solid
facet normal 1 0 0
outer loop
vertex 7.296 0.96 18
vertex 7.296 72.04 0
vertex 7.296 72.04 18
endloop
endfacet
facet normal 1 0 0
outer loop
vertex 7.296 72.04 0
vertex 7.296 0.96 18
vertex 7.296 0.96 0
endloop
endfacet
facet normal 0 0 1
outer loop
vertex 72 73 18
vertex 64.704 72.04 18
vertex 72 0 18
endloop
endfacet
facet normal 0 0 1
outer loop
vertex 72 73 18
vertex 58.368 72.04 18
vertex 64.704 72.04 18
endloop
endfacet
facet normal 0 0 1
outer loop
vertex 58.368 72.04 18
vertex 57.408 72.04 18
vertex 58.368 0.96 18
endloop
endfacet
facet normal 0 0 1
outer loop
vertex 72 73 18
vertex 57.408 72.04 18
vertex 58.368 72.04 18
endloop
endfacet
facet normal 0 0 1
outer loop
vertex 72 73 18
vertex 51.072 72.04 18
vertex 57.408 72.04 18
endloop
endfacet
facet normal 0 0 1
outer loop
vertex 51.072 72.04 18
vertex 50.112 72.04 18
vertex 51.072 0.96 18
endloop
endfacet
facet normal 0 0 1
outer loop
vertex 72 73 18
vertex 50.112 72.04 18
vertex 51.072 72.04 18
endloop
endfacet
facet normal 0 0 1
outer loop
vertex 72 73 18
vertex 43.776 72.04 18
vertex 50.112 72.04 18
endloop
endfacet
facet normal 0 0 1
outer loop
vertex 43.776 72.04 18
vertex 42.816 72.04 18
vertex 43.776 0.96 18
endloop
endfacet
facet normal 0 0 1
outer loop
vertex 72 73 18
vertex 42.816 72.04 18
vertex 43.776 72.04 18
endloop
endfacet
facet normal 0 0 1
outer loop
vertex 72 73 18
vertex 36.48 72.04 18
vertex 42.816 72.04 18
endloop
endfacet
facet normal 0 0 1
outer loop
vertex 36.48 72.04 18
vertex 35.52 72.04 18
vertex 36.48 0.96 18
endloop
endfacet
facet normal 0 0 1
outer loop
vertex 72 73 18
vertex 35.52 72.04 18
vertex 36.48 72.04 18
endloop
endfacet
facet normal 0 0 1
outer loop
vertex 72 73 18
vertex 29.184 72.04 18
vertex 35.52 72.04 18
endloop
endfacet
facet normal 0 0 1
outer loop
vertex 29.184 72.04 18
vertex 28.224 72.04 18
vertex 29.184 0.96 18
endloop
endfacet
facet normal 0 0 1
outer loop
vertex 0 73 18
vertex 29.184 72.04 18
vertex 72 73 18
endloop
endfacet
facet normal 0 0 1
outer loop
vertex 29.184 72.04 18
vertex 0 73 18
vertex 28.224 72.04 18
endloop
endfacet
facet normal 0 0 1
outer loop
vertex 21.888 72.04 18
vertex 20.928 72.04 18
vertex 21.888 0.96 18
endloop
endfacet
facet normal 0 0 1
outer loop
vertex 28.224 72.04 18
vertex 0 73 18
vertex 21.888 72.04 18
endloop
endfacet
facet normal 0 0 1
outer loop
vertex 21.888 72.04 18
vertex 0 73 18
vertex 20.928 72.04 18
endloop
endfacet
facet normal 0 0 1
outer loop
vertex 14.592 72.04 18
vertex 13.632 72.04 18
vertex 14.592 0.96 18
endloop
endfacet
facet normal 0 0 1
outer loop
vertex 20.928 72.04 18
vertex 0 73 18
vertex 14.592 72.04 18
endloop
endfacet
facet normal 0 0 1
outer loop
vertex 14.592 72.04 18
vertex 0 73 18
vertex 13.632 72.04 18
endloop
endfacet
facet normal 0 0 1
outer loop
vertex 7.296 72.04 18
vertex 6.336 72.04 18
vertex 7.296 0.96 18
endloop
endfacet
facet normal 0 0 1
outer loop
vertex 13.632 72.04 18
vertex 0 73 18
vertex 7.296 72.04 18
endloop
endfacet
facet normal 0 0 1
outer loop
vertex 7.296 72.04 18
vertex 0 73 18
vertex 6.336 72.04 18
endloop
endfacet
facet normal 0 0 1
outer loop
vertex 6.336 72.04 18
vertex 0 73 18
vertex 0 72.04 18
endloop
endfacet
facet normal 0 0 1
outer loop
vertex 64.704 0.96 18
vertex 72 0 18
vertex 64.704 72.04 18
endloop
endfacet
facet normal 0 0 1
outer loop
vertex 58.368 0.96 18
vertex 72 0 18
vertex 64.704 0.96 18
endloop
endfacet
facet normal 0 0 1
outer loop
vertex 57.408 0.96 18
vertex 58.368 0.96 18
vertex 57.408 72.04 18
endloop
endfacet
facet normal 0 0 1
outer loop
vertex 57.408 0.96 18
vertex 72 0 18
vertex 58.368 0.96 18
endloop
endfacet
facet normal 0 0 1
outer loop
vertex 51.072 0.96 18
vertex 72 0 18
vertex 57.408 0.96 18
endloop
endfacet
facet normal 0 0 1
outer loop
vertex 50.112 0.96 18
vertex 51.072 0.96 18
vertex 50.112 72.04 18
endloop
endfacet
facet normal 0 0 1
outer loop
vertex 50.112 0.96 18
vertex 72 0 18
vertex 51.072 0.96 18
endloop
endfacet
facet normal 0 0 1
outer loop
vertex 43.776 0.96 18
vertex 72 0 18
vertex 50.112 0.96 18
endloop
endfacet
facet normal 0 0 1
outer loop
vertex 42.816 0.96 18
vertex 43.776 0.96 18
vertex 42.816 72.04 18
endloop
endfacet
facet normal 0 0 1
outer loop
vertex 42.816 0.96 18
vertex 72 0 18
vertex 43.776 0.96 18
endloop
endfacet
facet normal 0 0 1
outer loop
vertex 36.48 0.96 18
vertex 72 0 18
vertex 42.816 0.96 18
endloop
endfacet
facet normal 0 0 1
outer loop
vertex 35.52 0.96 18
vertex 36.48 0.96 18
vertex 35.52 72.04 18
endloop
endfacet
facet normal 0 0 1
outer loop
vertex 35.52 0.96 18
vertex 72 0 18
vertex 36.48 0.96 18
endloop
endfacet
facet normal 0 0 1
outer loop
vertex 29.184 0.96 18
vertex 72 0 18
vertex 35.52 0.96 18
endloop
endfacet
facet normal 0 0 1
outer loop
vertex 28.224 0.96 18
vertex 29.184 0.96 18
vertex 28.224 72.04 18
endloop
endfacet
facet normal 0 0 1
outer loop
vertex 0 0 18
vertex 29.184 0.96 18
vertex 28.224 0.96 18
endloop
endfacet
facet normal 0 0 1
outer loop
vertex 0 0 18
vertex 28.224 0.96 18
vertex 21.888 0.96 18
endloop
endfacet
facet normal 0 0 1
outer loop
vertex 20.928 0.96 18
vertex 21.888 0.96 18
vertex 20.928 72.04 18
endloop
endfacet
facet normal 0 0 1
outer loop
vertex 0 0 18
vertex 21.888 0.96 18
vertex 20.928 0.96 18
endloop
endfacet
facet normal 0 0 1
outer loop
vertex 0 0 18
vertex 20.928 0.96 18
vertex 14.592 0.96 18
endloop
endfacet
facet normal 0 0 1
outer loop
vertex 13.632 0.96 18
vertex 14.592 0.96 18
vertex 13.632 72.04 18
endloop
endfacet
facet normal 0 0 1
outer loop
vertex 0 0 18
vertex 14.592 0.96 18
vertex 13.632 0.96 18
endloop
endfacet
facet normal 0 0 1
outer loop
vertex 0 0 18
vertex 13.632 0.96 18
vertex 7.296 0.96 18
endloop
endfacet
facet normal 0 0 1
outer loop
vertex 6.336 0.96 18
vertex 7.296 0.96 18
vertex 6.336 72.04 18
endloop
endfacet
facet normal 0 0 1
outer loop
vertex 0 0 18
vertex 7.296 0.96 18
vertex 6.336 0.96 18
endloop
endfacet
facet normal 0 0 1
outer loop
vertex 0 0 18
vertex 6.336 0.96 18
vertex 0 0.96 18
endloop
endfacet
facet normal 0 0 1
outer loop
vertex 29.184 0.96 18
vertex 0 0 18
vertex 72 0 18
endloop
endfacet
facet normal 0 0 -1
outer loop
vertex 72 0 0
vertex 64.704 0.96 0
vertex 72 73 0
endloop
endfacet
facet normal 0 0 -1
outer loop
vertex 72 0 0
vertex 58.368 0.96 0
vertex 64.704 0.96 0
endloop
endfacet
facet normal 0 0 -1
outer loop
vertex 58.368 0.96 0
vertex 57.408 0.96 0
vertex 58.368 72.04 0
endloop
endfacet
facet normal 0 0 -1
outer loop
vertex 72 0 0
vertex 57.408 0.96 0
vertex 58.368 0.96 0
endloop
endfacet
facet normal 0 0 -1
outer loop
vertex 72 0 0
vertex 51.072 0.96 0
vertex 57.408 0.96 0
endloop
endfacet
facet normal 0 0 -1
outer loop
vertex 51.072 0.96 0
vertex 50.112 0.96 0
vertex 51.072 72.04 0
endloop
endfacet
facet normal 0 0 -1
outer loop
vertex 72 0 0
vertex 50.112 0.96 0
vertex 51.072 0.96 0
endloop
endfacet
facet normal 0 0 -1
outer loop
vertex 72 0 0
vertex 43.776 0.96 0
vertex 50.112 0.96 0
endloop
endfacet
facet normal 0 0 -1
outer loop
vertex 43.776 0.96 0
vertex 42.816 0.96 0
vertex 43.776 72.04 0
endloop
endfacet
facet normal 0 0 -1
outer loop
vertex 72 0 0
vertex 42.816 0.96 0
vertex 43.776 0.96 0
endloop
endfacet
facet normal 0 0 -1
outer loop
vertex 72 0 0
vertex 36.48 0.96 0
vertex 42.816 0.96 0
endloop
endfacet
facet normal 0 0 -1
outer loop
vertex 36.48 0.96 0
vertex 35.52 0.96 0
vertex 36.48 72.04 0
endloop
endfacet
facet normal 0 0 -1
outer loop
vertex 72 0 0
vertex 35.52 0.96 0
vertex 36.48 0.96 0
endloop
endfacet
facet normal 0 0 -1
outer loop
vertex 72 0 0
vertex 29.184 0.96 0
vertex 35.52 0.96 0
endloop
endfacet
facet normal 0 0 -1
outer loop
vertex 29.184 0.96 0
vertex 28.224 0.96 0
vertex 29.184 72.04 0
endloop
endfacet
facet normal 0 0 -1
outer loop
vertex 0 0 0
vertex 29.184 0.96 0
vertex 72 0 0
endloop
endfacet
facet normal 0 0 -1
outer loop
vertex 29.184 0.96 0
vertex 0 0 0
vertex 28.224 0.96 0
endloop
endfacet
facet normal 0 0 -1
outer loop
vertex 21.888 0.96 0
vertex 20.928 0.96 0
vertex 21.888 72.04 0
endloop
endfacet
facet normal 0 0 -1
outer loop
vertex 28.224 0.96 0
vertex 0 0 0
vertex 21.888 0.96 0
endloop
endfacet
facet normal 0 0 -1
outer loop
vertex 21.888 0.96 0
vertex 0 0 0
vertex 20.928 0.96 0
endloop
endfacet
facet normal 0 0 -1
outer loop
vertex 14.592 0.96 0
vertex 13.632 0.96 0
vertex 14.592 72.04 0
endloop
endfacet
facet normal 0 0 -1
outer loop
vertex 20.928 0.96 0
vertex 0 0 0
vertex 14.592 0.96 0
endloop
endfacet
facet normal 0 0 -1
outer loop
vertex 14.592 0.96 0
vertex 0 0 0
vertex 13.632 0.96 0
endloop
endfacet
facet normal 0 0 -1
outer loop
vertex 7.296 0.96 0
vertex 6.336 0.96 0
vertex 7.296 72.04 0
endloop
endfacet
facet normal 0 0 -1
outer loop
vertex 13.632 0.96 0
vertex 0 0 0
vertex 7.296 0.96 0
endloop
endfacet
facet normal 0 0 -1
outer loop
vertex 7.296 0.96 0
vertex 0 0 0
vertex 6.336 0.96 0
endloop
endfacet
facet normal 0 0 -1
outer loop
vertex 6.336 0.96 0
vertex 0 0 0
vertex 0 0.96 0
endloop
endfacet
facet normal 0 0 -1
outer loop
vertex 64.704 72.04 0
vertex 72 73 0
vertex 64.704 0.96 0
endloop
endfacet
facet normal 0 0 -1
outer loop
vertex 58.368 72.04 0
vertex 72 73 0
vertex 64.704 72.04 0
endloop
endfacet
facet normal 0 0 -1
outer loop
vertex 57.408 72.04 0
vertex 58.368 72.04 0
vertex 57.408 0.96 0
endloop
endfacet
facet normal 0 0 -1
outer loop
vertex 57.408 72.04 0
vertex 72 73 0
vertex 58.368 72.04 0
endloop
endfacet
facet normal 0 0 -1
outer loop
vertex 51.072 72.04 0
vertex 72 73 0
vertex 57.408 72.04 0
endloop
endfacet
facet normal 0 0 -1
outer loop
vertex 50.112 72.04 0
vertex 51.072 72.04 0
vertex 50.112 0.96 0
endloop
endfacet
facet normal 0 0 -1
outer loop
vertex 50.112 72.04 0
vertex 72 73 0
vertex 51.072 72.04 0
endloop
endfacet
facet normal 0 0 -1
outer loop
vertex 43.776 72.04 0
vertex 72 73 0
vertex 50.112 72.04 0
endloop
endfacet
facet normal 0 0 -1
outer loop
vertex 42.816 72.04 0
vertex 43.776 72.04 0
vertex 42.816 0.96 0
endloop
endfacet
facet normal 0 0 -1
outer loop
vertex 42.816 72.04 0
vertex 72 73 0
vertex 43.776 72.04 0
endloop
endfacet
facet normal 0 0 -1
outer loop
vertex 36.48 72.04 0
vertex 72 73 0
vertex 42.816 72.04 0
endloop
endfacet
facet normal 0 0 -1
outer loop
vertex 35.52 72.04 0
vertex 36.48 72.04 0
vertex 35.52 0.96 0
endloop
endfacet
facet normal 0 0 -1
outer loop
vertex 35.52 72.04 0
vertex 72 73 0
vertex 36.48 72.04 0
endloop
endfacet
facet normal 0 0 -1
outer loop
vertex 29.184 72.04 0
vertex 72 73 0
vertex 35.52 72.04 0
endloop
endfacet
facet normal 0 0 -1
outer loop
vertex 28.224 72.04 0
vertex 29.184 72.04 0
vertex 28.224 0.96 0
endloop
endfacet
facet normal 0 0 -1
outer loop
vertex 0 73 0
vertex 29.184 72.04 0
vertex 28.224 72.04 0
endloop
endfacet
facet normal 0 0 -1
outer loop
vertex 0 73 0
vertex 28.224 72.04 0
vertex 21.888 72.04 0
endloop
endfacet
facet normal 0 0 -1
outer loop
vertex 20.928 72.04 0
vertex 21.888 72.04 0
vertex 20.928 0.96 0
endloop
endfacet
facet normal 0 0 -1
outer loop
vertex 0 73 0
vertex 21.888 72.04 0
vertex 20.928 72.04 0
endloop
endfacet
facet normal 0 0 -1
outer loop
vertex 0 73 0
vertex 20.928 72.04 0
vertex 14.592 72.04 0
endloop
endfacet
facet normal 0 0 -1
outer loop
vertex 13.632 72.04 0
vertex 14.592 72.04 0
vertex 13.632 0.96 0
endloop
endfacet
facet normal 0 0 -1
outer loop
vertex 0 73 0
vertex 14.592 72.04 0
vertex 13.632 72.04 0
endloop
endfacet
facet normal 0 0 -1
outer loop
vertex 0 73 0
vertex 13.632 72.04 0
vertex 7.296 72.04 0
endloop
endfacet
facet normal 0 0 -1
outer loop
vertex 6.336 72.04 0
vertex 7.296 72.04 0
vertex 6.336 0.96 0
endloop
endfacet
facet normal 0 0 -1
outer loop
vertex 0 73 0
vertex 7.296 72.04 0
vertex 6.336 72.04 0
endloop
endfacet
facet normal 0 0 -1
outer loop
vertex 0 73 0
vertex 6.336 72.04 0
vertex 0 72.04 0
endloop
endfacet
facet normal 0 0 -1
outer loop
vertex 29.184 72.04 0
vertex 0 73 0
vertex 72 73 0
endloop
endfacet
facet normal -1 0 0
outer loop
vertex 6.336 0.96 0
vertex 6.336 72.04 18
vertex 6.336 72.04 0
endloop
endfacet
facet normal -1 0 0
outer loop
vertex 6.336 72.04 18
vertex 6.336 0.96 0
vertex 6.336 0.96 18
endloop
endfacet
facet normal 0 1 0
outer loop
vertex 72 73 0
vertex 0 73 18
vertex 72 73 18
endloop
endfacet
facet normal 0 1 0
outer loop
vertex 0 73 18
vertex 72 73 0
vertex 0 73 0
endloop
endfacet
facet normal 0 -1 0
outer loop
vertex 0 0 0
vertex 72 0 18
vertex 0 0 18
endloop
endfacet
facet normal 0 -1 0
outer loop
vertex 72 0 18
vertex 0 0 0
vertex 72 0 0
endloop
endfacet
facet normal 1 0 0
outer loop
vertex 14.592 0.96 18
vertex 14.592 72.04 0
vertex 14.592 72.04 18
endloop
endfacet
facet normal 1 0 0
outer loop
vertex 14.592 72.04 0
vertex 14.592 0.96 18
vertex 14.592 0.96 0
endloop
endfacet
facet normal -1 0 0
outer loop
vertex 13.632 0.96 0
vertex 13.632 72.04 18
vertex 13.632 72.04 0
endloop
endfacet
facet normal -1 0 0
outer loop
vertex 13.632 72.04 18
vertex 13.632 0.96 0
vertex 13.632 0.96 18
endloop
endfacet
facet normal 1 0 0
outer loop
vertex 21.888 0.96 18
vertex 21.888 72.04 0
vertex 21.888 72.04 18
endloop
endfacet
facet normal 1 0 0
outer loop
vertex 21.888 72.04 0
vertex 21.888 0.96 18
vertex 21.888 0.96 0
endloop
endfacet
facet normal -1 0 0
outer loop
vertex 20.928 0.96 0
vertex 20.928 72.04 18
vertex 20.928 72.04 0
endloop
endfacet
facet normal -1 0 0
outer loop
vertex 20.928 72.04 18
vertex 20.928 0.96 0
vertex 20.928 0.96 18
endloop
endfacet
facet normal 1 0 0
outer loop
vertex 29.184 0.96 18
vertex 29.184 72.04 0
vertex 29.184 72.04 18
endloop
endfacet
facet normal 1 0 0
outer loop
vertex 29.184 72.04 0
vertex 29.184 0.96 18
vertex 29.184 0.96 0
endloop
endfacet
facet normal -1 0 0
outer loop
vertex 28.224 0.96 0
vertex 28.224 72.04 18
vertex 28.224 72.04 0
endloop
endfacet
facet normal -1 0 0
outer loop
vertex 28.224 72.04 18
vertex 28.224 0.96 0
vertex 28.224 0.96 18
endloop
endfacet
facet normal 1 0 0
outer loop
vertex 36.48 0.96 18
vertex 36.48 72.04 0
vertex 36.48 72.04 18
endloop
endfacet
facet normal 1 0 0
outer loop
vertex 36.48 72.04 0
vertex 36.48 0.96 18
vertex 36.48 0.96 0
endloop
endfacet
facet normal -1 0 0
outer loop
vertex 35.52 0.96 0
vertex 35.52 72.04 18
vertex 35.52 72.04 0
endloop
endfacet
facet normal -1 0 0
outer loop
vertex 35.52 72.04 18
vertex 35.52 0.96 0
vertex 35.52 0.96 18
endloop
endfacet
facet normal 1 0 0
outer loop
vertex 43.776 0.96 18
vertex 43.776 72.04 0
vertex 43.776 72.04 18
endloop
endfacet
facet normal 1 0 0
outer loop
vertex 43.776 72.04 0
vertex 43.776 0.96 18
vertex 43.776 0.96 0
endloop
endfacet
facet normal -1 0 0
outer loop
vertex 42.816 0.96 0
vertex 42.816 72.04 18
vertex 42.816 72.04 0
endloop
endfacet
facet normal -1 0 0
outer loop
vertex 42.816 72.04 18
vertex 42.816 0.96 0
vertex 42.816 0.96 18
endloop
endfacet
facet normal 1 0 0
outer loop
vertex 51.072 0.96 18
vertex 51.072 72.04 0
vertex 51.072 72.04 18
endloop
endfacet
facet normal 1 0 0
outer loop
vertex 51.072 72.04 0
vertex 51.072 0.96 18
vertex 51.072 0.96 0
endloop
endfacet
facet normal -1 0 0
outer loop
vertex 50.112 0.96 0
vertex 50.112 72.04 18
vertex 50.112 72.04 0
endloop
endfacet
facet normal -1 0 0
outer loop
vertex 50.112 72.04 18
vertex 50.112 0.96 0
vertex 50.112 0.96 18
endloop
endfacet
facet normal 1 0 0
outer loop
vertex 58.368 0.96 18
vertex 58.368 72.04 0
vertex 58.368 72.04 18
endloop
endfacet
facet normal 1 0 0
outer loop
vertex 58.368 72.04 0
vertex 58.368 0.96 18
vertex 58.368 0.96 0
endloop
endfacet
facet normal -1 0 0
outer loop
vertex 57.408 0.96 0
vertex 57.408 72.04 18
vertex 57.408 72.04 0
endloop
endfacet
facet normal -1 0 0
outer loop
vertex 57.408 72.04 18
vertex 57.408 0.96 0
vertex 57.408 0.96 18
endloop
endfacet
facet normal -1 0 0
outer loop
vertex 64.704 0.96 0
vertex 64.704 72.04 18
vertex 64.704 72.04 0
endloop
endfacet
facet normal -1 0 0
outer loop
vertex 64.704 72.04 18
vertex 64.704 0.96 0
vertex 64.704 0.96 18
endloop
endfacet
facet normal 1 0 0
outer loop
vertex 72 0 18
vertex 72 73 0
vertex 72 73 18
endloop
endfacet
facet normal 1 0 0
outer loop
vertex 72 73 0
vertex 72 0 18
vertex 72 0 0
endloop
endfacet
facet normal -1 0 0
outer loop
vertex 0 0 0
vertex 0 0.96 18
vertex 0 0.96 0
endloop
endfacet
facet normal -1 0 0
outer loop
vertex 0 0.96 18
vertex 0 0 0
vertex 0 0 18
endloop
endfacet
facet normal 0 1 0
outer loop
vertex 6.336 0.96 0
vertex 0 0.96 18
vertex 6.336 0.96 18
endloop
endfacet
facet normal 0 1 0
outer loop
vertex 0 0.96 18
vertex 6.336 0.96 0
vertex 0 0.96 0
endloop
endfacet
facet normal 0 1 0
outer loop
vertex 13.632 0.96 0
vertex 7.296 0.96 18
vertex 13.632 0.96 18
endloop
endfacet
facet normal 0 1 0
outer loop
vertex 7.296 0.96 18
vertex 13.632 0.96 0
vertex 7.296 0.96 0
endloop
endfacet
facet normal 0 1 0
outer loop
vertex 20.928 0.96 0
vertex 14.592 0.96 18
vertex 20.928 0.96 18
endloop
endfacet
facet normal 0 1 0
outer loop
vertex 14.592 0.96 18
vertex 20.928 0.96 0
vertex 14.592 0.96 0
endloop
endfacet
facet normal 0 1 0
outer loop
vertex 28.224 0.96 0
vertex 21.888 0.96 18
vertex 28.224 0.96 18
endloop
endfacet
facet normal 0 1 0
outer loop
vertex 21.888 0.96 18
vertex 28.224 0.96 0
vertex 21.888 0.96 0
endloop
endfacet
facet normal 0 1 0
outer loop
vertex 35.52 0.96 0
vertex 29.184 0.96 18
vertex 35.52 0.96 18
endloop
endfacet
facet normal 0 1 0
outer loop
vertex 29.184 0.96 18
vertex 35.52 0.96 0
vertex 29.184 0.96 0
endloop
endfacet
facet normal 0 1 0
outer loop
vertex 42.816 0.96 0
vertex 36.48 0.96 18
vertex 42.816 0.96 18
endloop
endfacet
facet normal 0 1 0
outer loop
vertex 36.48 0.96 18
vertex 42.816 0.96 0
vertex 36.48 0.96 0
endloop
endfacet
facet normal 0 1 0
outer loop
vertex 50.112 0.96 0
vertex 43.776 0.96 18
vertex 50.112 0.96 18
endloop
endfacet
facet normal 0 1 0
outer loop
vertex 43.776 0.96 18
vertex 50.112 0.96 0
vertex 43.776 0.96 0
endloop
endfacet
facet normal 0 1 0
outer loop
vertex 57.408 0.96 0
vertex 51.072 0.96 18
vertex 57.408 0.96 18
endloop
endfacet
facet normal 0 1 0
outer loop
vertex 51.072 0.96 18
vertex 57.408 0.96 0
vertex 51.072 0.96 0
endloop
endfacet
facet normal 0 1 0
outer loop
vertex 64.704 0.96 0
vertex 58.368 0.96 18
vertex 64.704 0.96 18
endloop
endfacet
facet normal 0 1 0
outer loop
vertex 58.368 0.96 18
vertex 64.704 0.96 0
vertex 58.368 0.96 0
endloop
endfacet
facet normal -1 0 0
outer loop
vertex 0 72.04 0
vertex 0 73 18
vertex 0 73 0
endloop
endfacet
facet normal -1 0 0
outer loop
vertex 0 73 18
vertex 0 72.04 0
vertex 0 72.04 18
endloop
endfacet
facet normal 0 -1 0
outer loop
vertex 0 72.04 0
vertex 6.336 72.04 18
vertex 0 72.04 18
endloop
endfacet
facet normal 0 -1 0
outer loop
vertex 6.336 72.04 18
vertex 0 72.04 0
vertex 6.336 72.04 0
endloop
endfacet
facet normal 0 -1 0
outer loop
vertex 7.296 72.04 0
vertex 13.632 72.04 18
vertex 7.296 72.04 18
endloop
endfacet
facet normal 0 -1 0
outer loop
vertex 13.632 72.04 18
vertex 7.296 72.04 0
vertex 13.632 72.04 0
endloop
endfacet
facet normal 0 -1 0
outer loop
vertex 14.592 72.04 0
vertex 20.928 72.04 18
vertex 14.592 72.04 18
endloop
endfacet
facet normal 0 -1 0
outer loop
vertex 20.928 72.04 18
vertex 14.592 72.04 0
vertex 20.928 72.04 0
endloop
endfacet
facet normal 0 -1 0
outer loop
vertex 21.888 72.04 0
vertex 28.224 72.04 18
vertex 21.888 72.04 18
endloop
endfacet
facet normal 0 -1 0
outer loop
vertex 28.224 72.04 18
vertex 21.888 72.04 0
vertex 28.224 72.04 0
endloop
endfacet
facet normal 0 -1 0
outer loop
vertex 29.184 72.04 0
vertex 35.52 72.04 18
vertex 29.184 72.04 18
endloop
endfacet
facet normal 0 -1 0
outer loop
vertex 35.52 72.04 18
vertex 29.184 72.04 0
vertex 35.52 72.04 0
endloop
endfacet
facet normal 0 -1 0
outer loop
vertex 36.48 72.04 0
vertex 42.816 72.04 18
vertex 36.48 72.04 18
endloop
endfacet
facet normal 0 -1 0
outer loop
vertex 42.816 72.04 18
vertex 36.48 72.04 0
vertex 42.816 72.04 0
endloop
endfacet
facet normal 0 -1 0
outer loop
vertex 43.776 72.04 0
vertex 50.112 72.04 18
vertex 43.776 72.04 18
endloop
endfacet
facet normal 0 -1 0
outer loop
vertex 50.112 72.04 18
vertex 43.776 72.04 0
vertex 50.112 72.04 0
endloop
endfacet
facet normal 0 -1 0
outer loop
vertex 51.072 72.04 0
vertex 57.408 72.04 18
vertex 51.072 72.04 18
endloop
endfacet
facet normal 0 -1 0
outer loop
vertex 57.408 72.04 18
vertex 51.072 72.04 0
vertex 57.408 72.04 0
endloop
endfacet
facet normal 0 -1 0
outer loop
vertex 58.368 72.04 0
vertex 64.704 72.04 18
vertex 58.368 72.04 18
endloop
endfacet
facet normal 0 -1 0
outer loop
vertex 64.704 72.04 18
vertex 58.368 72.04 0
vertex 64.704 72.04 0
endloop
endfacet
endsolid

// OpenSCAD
dim = [72, 73, 18];
xy_thickness = 0.48*2;


x_cells = 10;

cube([dim[0],xy_thickness, dim[2]]);
translate([0,dim[1]-xy_thickness,0])
cube([dim[0],xy_thickness, dim[2]]);

cell_width = (dim[0] - xy_thickness*(x_cells - 1))/x_cells;

for (k = [1:x_cells-1]) {
    translate([cell_width*k + xy_thickness*(k-1),0,0])
    cube([xy_thickness,dim[1],dim[2]]);
}

translate([cell_width*9 + xy_thickness*9,0,0])
#cube([cell_width,dim[1],dim[2]]);
